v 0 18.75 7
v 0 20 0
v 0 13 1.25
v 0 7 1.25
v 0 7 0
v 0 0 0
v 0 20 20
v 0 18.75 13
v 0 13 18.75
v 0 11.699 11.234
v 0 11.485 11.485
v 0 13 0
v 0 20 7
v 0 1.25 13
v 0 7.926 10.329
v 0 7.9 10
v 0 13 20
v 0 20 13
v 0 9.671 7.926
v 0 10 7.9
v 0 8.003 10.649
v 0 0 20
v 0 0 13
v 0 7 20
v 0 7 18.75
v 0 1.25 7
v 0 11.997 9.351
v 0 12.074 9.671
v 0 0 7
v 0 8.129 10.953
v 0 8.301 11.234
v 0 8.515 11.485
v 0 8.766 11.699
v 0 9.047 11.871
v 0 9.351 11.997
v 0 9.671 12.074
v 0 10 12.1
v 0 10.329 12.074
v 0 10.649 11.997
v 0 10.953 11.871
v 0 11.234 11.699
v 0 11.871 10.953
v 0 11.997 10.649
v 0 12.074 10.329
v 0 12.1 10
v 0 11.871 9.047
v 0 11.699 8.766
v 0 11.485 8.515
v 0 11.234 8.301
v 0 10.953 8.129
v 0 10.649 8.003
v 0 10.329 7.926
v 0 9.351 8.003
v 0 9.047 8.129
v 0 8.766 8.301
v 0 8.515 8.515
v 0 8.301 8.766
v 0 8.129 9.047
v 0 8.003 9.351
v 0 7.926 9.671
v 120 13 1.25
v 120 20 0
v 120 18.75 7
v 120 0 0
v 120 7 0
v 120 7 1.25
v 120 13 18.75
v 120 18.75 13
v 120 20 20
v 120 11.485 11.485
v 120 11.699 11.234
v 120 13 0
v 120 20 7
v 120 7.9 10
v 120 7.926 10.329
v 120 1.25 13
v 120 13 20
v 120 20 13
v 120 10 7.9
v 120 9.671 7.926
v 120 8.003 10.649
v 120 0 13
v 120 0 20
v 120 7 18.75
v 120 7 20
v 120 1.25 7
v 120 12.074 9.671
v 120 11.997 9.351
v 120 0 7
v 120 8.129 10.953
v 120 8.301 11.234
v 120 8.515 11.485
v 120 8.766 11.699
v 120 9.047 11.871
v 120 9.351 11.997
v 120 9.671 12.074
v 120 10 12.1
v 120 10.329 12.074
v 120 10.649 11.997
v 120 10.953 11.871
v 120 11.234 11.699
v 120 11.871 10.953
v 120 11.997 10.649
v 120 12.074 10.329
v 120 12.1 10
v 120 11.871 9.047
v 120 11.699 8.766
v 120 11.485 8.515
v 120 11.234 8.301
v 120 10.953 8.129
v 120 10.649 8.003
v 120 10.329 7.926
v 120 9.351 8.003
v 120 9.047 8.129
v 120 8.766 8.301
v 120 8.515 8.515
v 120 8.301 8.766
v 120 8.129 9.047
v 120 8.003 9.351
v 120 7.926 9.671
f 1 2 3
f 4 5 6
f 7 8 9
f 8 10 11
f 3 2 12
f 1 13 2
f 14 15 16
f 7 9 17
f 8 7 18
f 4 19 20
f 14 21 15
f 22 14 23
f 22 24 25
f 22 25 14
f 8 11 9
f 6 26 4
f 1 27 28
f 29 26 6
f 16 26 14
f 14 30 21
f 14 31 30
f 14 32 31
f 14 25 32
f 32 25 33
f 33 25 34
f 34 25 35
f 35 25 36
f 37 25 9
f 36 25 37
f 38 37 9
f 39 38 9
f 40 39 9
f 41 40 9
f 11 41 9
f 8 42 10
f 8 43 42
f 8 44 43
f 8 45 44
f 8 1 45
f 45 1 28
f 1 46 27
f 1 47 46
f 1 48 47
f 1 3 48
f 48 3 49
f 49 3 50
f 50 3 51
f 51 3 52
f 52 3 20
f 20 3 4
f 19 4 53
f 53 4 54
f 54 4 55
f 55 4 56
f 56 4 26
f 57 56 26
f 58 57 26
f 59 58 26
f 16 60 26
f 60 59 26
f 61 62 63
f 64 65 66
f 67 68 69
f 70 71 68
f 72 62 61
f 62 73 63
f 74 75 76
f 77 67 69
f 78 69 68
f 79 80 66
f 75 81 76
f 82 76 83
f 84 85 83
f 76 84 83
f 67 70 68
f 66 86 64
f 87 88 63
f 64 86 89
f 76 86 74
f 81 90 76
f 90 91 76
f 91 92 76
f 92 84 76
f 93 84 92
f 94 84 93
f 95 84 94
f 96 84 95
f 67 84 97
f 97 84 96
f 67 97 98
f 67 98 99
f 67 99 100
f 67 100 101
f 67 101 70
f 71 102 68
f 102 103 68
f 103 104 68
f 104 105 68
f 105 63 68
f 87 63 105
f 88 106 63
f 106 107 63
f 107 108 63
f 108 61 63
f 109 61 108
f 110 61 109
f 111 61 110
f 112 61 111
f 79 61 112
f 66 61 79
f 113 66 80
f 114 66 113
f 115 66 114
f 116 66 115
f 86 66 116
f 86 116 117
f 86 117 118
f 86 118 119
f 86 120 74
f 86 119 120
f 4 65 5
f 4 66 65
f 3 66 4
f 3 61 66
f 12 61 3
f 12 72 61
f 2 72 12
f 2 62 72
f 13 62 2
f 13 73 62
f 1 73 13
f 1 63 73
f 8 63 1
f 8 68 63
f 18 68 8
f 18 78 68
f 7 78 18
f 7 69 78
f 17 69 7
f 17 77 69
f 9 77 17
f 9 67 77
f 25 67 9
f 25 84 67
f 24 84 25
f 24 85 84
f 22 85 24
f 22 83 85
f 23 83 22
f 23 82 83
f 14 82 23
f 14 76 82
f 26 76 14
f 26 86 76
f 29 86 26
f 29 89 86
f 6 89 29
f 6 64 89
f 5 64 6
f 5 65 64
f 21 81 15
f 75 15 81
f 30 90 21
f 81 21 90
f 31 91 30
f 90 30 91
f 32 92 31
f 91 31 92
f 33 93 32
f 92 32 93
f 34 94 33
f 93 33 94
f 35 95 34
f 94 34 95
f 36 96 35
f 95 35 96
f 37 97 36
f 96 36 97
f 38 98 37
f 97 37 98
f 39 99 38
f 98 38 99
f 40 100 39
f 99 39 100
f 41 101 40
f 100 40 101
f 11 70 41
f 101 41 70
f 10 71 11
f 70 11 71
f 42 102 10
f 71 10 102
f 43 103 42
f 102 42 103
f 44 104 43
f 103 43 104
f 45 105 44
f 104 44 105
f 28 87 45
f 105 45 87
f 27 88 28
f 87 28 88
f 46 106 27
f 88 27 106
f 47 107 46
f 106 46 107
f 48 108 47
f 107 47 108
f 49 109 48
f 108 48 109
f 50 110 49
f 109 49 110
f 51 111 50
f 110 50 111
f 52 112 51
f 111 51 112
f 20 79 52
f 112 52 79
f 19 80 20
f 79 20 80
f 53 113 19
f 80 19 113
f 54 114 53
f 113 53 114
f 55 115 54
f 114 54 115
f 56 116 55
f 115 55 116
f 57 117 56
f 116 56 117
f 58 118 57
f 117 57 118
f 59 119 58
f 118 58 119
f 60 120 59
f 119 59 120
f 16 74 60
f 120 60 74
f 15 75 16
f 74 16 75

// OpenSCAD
// HUB75 display case component: aluminium_extrusion
include <../config/project_config.scad>

module extrusion_cross_section_2d() {
    difference() {
        square([extrusion_size, extrusion_size], center=true);
        circle(d=4.2);
        for(a=[0:90:270]) rotate(a) translate([0,extrusion_size/2]) square([6,2.5],center=true);
    }
}

module aluminium_extrusion_3d(length, horizontaal=true) {
    color(color_extrusion)
    if(horizontaal)
        translate([0,extrusion_size/2,extrusion_size/2]) rotate([0,90,0]) linear_extrude(length) extrusion_cross_section_2d();
    else
        translate([extrusion_size/2,extrusion_size/2,0]) linear_extrude(length) extrusion_cross_section_2d();
}

/* [Standalone preview] */
preview_length = 120; // [40:10:840]
aluminium_extrusion_3d(preview_length, true);
